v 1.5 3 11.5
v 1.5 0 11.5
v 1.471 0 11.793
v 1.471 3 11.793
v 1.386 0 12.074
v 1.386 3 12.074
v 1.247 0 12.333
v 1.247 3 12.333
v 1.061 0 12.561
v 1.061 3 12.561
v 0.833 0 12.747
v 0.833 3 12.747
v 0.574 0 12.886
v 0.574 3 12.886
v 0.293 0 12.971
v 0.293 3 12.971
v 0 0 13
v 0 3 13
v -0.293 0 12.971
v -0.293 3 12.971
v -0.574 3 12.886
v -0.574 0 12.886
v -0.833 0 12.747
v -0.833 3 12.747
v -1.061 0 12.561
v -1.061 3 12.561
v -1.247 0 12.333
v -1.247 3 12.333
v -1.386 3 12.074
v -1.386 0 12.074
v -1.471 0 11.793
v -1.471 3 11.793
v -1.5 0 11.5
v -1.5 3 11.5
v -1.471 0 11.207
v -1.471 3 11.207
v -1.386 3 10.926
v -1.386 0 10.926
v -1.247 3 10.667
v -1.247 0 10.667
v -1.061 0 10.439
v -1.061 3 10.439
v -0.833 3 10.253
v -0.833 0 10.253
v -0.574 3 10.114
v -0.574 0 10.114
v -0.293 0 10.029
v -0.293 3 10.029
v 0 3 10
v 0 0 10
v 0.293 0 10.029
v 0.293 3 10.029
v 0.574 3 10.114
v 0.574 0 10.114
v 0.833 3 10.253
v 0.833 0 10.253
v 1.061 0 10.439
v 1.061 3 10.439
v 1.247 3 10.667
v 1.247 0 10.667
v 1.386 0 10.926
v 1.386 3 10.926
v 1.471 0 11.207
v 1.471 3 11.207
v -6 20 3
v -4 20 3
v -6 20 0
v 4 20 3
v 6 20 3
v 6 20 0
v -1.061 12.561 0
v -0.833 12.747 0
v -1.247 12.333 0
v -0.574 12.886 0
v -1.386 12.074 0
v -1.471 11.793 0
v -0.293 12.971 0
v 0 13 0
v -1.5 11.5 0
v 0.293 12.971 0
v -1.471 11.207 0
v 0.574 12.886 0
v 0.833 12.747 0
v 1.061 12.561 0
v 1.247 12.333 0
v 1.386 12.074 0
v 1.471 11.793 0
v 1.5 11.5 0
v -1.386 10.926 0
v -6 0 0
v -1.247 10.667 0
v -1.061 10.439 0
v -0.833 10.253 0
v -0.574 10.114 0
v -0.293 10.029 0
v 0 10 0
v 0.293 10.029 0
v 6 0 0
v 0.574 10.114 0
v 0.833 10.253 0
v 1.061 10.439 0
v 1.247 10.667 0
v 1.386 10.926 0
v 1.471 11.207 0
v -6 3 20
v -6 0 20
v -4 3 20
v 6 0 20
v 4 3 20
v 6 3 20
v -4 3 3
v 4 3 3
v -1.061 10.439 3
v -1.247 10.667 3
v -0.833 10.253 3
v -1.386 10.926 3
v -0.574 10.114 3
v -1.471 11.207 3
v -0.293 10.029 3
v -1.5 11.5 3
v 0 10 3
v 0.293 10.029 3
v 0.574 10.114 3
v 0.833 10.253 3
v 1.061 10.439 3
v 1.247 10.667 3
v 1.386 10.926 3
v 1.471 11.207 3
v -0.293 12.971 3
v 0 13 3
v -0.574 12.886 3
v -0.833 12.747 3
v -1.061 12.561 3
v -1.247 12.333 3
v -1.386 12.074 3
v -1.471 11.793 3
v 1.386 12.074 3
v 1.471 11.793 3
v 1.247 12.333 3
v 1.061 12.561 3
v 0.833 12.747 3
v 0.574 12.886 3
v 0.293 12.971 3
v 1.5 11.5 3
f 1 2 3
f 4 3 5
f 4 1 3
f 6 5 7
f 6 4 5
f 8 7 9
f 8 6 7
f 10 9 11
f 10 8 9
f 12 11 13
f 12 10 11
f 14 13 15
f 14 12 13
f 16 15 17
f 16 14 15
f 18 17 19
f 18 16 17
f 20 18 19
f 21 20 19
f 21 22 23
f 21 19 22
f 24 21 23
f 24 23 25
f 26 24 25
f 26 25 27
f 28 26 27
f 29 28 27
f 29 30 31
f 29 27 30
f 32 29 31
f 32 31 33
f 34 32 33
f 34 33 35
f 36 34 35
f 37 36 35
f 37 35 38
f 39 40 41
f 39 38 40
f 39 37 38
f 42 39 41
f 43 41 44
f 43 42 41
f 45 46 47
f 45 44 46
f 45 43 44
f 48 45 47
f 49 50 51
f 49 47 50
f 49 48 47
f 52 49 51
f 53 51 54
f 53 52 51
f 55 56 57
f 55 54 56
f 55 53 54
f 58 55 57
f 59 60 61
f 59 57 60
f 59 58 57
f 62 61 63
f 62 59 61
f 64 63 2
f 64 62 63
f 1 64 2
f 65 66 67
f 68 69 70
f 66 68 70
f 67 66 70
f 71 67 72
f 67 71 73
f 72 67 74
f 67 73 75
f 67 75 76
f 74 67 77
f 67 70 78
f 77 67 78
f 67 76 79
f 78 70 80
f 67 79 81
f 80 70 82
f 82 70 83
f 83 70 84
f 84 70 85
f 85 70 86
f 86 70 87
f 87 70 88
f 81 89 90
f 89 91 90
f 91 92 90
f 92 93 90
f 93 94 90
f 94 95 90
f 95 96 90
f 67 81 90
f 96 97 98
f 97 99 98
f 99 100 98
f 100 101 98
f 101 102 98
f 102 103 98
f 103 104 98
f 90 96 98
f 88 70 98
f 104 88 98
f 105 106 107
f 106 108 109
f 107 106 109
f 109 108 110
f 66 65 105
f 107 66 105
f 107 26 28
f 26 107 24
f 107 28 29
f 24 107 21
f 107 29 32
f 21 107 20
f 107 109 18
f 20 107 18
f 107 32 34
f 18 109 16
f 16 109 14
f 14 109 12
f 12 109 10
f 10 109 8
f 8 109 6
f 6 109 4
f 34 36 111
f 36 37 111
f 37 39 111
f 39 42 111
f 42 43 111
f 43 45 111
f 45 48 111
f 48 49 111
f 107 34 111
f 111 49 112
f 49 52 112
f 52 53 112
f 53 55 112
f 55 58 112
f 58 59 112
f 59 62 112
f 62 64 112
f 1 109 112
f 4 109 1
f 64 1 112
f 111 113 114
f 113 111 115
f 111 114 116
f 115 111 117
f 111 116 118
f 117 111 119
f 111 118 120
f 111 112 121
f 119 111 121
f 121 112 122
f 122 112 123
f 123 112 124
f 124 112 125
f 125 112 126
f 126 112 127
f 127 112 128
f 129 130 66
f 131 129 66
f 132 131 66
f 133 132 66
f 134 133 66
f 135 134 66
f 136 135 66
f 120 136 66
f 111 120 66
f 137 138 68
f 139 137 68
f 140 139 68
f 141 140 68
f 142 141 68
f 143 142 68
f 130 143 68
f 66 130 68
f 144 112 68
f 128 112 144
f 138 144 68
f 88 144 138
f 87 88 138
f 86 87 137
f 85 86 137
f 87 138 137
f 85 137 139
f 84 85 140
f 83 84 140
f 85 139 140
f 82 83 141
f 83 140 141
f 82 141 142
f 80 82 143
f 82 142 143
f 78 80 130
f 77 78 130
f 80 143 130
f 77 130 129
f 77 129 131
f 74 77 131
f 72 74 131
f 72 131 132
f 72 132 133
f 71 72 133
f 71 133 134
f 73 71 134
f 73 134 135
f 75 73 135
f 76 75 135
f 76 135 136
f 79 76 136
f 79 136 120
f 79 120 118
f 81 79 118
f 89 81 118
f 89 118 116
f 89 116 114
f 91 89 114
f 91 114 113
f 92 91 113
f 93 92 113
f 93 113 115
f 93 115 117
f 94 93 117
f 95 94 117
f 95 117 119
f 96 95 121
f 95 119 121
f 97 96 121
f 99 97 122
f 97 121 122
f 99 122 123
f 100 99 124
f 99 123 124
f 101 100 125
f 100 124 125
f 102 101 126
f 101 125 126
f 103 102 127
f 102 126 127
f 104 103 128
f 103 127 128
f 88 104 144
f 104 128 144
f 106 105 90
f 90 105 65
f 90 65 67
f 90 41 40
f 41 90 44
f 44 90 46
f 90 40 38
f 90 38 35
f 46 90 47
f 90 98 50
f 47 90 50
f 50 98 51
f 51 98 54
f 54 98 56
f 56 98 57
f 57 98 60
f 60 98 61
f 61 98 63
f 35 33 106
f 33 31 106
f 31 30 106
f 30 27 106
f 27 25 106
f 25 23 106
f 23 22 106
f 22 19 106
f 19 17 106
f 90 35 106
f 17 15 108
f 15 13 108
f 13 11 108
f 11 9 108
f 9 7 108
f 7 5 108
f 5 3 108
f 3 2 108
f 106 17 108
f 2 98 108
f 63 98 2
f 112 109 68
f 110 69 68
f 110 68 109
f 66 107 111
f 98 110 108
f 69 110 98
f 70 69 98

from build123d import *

# Parameters (mm, degrees)
AUFSATZ_LINEAR_AUSTRAGEN1_DEPTH = 6
AUFSATZ_LINEAR_START            = 6
AUFSATZ_LINEAR_AUSTRAGEN4_DEPTH = 2
AUFSATZ_LINEAR_START_2          = -6
AUFSATZ_LINEAR_AUSTRAGEN5_DEPTH = 2
SKIZZE2_R                       = 1.5
SCHNITT_LINEAR_AUSTRAGEN1_DEPTH = 4


with BuildPart() as part:
    # Skizze1 → Aufsatz-Linear austragen1 (new body, symmetric)
    with BuildSketch(Plane(origin=(0, 0, 0), x_dir=(0, 0, -1), z_dir=(1, 0, 0))):
        Polygon((0, 20), (0, 0), (-20, 0), (-20, 3), (-3, 3), (-3, 20), align=None)
    extrude(amount=AUFSATZ_LINEAR_AUSTRAGEN1_DEPTH, both=True)

    # Skizze1_3 → Aufsatz-Linear austragen4 (add)
    with BuildSketch(Plane(origin=(0, 0, 0), x_dir=(0, 0, -1), z_dir=(1, 0, 0)).offset(AUFSATZ_LINEAR_START)):
        Polygon((-3, 3), (-3, 20), (-20, 3), align=None)
    extrude(amount=-AUFSATZ_LINEAR_AUSTRAGEN4_DEPTH)

    # Skizze1_4 → Aufsatz-Linear austragen5 (add)
    with BuildSketch(Plane(origin=(0, 0, 0), x_dir=(0, 0, -1), z_dir=(1, 0, 0)).offset(AUFSATZ_LINEAR_START_2)):
        Polygon((-3, 3), (-3, 20), (-20, 3), align=None)
    extrude(amount=AUFSATZ_LINEAR_AUSTRAGEN5_DEPTH)

    # Skizze2 → Schnitt-Linear austragen1 (cut, through all)
    with BuildSketch(Plane.XY.offset(3)):
        with Locations((0, 11.5)):
            Circle(SKIZZE2_R)
    schnitt_linear_austragen1 = extrude(amount=-SCHNITT_LINEAR_AUSTRAGEN1_DEPTH, mode=Mode.SUBTRACT)

    # Spiegeln2: Schnitt-Linear austragen1 across plane
    add(schnitt_linear_austragen1.mirror(Plane(origin=(0, 0, 0), x_dir=(0, 0.707106781, 0.707106781), z_dir=(0, -0.707106781, 0.707106781))), mode=Mode.SUBTRACT)


solid = part.part
